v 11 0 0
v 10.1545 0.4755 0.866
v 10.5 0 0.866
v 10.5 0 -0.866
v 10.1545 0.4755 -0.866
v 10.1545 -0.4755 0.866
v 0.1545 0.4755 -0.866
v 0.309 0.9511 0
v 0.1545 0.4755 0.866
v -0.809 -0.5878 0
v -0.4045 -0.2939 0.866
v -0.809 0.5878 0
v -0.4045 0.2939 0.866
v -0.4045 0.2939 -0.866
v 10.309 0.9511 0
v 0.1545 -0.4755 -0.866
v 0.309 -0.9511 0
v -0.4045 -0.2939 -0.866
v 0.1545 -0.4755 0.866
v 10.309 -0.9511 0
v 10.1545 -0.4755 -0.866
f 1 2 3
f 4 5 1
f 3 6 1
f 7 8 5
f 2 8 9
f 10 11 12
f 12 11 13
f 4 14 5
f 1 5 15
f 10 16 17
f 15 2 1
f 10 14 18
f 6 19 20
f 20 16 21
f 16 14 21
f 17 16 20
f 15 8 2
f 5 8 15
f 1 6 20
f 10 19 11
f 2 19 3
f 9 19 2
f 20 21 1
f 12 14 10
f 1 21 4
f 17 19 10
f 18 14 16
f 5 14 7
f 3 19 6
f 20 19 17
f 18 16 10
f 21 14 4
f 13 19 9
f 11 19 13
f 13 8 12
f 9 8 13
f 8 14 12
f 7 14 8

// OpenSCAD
hull() {
    translate([0,0,0]) sphere(1);
    translate([10,0,0]) sphere(1);
}
